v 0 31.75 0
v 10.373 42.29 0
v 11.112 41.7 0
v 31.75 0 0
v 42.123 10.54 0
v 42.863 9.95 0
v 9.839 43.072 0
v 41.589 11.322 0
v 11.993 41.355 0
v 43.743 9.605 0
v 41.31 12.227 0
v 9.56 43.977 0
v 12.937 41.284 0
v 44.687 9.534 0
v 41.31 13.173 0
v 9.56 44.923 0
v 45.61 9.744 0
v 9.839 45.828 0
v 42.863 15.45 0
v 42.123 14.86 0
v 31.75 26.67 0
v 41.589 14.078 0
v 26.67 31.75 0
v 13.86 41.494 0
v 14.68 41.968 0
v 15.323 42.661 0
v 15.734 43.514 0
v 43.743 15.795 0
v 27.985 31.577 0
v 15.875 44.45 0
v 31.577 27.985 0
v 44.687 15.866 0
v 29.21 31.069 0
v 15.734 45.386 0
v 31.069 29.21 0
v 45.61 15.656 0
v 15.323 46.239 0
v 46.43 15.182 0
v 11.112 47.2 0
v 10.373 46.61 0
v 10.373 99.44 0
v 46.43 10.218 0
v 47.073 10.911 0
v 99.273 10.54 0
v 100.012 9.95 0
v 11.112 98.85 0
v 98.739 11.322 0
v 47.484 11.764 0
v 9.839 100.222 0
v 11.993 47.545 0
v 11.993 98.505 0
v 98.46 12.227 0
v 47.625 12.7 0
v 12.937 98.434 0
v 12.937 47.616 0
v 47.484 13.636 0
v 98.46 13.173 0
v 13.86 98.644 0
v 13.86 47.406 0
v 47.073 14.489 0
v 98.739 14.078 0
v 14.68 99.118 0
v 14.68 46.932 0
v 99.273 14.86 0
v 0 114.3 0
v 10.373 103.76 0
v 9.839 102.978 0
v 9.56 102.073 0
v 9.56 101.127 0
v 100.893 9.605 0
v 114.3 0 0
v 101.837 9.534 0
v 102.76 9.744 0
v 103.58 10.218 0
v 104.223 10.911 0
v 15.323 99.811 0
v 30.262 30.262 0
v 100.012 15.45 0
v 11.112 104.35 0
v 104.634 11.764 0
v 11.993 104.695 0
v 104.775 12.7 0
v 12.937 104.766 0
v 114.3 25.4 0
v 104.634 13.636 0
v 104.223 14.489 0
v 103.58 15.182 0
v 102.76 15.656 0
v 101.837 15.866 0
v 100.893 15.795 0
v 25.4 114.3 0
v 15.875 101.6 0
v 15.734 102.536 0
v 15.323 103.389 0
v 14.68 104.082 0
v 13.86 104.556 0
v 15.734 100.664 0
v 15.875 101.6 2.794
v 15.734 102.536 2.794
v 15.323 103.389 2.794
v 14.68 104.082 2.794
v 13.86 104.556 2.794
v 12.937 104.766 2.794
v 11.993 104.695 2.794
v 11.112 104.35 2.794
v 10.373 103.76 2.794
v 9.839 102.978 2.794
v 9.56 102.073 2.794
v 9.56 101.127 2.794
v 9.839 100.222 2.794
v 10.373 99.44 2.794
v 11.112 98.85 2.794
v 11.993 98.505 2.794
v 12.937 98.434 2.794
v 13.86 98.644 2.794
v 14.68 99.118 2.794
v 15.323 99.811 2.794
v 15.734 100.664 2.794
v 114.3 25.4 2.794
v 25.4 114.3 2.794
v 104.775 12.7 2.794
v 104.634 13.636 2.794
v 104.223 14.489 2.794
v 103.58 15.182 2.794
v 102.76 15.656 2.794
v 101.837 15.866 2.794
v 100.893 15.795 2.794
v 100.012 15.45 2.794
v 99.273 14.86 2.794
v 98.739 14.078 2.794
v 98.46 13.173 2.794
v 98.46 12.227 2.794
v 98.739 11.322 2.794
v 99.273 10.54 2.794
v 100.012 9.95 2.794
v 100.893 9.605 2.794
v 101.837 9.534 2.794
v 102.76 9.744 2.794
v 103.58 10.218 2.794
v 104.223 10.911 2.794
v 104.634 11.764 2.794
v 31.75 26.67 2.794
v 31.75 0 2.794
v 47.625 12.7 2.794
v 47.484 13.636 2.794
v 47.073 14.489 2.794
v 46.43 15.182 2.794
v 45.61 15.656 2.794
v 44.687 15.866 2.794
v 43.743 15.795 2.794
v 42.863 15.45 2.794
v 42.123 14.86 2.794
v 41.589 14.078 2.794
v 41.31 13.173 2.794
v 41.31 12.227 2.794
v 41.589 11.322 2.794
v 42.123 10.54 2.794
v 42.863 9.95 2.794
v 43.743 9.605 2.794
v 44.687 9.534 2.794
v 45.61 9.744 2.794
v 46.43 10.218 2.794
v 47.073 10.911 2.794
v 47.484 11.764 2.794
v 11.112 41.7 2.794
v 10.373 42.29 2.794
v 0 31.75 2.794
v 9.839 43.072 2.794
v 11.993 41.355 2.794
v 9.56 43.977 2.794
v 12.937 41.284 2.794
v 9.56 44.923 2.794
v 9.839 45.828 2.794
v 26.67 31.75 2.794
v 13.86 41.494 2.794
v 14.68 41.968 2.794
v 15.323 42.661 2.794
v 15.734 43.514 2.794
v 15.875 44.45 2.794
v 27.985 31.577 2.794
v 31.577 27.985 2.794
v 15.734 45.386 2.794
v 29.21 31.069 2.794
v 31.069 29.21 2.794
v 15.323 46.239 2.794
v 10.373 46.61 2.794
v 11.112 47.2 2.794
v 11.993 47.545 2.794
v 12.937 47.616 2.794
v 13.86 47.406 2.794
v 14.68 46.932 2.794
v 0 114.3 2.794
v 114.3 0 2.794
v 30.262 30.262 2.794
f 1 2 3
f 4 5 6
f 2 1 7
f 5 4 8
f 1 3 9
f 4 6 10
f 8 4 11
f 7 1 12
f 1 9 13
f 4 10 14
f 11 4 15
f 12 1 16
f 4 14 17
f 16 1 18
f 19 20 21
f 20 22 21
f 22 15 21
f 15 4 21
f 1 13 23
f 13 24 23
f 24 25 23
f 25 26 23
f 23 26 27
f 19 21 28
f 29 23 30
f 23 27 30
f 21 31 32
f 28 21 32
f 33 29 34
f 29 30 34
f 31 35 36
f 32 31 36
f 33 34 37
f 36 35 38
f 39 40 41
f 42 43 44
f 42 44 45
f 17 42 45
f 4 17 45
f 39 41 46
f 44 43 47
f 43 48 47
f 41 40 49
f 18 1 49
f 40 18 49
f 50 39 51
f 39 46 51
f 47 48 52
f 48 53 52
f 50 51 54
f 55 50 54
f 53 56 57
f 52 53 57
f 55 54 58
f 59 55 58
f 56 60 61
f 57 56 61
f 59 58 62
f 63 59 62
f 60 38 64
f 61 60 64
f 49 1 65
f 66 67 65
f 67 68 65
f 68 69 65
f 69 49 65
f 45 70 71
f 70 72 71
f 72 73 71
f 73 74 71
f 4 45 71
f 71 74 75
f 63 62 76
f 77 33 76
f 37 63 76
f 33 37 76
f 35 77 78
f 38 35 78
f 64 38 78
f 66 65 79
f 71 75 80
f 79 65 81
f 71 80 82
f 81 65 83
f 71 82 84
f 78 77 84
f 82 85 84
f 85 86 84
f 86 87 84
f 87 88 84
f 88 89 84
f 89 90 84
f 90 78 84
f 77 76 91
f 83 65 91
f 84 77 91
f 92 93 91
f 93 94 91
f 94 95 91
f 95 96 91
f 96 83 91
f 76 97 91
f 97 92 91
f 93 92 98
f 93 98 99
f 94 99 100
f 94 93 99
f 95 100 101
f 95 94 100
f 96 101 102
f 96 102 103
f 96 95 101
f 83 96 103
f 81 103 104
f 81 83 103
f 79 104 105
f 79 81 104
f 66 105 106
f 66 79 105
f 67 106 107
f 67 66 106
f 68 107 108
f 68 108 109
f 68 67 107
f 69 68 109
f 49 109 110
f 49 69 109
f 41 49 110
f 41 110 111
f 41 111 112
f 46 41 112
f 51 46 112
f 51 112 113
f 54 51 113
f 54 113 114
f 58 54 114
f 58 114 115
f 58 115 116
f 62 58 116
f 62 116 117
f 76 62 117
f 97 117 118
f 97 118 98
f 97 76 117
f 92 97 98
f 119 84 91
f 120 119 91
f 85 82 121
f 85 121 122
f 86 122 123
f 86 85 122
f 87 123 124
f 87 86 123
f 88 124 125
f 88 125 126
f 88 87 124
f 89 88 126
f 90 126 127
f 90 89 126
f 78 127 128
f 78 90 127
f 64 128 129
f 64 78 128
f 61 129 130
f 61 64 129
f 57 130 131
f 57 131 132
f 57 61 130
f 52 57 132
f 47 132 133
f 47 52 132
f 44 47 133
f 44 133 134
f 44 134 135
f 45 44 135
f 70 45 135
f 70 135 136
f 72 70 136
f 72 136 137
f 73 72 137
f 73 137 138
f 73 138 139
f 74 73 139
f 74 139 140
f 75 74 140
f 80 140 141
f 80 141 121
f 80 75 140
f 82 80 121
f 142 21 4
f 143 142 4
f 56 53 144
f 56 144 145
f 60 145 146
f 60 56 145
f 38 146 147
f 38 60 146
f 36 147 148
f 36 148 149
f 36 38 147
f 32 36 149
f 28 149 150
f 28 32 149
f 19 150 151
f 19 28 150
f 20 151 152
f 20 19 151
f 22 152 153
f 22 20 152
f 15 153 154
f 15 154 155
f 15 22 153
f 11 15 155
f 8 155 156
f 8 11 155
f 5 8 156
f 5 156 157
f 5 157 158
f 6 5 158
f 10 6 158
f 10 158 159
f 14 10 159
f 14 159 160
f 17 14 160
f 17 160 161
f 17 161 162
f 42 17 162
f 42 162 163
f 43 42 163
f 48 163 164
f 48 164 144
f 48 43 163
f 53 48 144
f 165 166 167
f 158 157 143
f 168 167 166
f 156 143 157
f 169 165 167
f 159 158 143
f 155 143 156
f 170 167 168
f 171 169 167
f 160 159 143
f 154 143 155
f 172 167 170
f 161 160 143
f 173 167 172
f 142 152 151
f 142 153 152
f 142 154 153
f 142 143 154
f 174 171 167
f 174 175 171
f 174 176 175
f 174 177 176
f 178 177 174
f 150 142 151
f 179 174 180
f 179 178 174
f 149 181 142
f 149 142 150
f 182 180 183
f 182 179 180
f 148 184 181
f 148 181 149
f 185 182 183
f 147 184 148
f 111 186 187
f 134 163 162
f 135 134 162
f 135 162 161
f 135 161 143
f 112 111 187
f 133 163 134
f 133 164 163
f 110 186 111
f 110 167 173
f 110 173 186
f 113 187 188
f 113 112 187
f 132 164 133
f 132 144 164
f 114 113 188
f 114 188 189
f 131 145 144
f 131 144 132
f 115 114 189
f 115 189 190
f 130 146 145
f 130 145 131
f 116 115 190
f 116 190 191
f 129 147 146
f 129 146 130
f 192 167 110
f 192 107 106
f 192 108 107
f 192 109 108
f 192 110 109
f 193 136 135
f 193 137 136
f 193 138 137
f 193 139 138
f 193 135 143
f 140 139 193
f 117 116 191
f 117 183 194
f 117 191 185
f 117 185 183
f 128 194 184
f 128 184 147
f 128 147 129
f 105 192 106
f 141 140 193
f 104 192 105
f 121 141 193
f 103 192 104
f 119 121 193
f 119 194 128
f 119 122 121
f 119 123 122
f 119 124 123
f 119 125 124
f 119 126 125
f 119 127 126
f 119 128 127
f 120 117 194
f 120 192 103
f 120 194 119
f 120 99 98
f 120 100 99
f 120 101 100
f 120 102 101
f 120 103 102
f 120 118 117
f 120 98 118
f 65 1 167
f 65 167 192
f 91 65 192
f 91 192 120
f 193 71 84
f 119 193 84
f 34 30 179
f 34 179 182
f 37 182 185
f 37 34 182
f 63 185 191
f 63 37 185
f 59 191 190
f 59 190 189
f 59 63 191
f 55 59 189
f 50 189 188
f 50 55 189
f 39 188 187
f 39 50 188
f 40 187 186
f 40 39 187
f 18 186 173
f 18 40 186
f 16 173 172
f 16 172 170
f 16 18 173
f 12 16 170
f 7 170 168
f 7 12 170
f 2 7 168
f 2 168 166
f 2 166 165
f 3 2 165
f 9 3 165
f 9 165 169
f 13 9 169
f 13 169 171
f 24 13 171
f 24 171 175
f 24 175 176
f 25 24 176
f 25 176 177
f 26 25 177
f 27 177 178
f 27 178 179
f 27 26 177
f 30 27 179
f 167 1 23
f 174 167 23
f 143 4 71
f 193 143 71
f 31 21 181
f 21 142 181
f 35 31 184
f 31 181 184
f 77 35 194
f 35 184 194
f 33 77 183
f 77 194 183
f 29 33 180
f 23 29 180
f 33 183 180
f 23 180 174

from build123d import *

# Parameters (mm, degrees)
F0_W     = 82.55
F0_H     = 25.4
F0_R     = 3.175
F0_W_2   = 25.4
F0_H_2   = 82.55
F1_DEPTH = 2.794
F2_R     = 5.08


with BuildPart() as f1:
    # F0 (on Top) → F1 (new body)
    with BuildSketch(Plane.XY):
        Polygon((25.4, 114.3), (25.4, 31.75), (31.75, 31.75), (31.75, 25.4), (114.3, 25.4), align=None)
        with Locations((73.025, 12.7)):
            Rectangle(F0_W, F0_H)
        with Locations((44.45, 12.7)):
            Circle(F0_R, mode=Mode.SUBTRACT)
        with Locations((101.6, 12.7)):
            Circle(F0_R, mode=Mode.SUBTRACT)
        with Locations((12.7, 73.025)):
            Rectangle(F0_W_2, F0_H_2)
        with Locations((12.7, 44.45)):
            Circle(F0_R, mode=Mode.SUBTRACT)
        with Locations((12.7, 101.6)):
            Circle(F0_R, mode=Mode.SUBTRACT)
    extrude(amount=F1_DEPTH)

    # F2
    f2_edges = [f1.edges().sort_by_distance(p)[0] for p in [
        (31.75, 31.75, 1.397),
    ]]
    fillet(f2_edges, radius=F2_R)


solid = f1.part
